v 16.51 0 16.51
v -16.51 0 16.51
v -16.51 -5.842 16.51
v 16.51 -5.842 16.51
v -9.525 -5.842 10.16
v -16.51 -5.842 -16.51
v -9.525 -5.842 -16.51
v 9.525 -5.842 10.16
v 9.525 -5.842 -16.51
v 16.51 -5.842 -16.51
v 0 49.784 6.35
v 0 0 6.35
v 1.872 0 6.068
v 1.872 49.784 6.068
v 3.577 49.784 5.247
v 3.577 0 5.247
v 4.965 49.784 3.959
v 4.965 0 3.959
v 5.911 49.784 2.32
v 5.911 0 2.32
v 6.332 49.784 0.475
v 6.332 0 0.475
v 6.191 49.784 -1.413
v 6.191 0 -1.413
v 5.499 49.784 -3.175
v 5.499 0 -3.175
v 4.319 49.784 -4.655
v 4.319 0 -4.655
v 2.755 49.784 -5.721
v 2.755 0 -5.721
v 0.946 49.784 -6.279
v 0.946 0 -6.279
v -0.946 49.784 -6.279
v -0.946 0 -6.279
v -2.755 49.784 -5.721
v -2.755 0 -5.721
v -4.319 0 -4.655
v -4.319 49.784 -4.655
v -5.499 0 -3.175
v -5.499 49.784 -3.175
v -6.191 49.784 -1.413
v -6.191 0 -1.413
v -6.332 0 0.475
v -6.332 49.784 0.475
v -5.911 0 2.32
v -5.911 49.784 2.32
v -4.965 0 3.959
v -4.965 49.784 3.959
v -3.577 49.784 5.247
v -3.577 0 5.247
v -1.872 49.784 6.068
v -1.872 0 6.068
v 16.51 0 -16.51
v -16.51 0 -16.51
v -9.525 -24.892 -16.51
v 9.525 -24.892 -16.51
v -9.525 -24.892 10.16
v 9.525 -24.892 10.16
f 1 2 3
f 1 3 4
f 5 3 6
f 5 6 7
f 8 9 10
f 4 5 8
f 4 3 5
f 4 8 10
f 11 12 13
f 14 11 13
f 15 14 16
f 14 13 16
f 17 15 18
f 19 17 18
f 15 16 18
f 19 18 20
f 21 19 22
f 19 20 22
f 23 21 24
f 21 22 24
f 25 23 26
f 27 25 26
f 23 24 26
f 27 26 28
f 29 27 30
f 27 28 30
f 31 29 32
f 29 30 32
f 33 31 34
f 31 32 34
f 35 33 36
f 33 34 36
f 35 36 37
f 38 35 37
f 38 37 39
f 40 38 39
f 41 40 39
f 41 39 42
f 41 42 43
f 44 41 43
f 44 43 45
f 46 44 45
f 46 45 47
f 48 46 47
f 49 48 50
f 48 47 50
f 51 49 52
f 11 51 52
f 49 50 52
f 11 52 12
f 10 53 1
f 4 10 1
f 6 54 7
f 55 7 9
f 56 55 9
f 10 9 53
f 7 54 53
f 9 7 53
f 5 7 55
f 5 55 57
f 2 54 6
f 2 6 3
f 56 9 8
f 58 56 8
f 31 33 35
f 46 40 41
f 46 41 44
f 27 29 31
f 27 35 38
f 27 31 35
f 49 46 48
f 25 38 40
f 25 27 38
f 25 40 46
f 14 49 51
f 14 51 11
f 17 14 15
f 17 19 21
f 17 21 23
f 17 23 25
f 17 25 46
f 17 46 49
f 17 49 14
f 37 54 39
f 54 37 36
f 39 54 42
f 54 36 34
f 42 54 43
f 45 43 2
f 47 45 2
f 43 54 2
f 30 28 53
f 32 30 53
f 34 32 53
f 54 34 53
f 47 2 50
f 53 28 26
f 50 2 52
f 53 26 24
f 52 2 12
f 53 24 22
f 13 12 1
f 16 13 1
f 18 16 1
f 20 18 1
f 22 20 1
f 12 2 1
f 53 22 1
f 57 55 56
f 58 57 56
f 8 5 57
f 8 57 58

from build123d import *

# Parameters (mm, degrees)
SKETCH1_R           = 6.35
BOSS_EXTRUDE1_DEPTH = 49.784
SKETCH2_W           = 33.02
SKETCH2_H           = 33.02
BOSS_EXTRUDE2_DEPTH = 5.842
SKETCH3_W           = 19.05
SKETCH3_H           = 26.67
BOSS_EXTRUDE3_DEPTH = 19.05


with BuildPart() as part:
    # Sketch1 → Boss-Extrude1 (new body)
    with BuildSketch(Plane(origin=(0, 0, 0), x_dir=(1, 0, 0), z_dir=(0, 1, 0))):
        with Locations(Location((0, 0, 0), (0, 0, 270))):
            Circle(SKETCH1_R)
    extrude(amount=BOSS_EXTRUDE1_DEPTH)

    # Sketch2 → Boss-Extrude2 (add)
    with BuildSketch(Plane.XZ):
        Rectangle(SKETCH2_W, SKETCH2_H)
    extrude(amount=BOSS_EXTRUDE2_DEPTH)

    # Sketch3 → Boss-Extrude3 (add)
    with BuildSketch(Plane.XZ.offset(5.842)):
        with Locations((0, -3.175)):
            Rectangle(SKETCH3_W, SKETCH3_H)
    extrude(amount=BOSS_EXTRUDE3_DEPTH)


solid = part.part
